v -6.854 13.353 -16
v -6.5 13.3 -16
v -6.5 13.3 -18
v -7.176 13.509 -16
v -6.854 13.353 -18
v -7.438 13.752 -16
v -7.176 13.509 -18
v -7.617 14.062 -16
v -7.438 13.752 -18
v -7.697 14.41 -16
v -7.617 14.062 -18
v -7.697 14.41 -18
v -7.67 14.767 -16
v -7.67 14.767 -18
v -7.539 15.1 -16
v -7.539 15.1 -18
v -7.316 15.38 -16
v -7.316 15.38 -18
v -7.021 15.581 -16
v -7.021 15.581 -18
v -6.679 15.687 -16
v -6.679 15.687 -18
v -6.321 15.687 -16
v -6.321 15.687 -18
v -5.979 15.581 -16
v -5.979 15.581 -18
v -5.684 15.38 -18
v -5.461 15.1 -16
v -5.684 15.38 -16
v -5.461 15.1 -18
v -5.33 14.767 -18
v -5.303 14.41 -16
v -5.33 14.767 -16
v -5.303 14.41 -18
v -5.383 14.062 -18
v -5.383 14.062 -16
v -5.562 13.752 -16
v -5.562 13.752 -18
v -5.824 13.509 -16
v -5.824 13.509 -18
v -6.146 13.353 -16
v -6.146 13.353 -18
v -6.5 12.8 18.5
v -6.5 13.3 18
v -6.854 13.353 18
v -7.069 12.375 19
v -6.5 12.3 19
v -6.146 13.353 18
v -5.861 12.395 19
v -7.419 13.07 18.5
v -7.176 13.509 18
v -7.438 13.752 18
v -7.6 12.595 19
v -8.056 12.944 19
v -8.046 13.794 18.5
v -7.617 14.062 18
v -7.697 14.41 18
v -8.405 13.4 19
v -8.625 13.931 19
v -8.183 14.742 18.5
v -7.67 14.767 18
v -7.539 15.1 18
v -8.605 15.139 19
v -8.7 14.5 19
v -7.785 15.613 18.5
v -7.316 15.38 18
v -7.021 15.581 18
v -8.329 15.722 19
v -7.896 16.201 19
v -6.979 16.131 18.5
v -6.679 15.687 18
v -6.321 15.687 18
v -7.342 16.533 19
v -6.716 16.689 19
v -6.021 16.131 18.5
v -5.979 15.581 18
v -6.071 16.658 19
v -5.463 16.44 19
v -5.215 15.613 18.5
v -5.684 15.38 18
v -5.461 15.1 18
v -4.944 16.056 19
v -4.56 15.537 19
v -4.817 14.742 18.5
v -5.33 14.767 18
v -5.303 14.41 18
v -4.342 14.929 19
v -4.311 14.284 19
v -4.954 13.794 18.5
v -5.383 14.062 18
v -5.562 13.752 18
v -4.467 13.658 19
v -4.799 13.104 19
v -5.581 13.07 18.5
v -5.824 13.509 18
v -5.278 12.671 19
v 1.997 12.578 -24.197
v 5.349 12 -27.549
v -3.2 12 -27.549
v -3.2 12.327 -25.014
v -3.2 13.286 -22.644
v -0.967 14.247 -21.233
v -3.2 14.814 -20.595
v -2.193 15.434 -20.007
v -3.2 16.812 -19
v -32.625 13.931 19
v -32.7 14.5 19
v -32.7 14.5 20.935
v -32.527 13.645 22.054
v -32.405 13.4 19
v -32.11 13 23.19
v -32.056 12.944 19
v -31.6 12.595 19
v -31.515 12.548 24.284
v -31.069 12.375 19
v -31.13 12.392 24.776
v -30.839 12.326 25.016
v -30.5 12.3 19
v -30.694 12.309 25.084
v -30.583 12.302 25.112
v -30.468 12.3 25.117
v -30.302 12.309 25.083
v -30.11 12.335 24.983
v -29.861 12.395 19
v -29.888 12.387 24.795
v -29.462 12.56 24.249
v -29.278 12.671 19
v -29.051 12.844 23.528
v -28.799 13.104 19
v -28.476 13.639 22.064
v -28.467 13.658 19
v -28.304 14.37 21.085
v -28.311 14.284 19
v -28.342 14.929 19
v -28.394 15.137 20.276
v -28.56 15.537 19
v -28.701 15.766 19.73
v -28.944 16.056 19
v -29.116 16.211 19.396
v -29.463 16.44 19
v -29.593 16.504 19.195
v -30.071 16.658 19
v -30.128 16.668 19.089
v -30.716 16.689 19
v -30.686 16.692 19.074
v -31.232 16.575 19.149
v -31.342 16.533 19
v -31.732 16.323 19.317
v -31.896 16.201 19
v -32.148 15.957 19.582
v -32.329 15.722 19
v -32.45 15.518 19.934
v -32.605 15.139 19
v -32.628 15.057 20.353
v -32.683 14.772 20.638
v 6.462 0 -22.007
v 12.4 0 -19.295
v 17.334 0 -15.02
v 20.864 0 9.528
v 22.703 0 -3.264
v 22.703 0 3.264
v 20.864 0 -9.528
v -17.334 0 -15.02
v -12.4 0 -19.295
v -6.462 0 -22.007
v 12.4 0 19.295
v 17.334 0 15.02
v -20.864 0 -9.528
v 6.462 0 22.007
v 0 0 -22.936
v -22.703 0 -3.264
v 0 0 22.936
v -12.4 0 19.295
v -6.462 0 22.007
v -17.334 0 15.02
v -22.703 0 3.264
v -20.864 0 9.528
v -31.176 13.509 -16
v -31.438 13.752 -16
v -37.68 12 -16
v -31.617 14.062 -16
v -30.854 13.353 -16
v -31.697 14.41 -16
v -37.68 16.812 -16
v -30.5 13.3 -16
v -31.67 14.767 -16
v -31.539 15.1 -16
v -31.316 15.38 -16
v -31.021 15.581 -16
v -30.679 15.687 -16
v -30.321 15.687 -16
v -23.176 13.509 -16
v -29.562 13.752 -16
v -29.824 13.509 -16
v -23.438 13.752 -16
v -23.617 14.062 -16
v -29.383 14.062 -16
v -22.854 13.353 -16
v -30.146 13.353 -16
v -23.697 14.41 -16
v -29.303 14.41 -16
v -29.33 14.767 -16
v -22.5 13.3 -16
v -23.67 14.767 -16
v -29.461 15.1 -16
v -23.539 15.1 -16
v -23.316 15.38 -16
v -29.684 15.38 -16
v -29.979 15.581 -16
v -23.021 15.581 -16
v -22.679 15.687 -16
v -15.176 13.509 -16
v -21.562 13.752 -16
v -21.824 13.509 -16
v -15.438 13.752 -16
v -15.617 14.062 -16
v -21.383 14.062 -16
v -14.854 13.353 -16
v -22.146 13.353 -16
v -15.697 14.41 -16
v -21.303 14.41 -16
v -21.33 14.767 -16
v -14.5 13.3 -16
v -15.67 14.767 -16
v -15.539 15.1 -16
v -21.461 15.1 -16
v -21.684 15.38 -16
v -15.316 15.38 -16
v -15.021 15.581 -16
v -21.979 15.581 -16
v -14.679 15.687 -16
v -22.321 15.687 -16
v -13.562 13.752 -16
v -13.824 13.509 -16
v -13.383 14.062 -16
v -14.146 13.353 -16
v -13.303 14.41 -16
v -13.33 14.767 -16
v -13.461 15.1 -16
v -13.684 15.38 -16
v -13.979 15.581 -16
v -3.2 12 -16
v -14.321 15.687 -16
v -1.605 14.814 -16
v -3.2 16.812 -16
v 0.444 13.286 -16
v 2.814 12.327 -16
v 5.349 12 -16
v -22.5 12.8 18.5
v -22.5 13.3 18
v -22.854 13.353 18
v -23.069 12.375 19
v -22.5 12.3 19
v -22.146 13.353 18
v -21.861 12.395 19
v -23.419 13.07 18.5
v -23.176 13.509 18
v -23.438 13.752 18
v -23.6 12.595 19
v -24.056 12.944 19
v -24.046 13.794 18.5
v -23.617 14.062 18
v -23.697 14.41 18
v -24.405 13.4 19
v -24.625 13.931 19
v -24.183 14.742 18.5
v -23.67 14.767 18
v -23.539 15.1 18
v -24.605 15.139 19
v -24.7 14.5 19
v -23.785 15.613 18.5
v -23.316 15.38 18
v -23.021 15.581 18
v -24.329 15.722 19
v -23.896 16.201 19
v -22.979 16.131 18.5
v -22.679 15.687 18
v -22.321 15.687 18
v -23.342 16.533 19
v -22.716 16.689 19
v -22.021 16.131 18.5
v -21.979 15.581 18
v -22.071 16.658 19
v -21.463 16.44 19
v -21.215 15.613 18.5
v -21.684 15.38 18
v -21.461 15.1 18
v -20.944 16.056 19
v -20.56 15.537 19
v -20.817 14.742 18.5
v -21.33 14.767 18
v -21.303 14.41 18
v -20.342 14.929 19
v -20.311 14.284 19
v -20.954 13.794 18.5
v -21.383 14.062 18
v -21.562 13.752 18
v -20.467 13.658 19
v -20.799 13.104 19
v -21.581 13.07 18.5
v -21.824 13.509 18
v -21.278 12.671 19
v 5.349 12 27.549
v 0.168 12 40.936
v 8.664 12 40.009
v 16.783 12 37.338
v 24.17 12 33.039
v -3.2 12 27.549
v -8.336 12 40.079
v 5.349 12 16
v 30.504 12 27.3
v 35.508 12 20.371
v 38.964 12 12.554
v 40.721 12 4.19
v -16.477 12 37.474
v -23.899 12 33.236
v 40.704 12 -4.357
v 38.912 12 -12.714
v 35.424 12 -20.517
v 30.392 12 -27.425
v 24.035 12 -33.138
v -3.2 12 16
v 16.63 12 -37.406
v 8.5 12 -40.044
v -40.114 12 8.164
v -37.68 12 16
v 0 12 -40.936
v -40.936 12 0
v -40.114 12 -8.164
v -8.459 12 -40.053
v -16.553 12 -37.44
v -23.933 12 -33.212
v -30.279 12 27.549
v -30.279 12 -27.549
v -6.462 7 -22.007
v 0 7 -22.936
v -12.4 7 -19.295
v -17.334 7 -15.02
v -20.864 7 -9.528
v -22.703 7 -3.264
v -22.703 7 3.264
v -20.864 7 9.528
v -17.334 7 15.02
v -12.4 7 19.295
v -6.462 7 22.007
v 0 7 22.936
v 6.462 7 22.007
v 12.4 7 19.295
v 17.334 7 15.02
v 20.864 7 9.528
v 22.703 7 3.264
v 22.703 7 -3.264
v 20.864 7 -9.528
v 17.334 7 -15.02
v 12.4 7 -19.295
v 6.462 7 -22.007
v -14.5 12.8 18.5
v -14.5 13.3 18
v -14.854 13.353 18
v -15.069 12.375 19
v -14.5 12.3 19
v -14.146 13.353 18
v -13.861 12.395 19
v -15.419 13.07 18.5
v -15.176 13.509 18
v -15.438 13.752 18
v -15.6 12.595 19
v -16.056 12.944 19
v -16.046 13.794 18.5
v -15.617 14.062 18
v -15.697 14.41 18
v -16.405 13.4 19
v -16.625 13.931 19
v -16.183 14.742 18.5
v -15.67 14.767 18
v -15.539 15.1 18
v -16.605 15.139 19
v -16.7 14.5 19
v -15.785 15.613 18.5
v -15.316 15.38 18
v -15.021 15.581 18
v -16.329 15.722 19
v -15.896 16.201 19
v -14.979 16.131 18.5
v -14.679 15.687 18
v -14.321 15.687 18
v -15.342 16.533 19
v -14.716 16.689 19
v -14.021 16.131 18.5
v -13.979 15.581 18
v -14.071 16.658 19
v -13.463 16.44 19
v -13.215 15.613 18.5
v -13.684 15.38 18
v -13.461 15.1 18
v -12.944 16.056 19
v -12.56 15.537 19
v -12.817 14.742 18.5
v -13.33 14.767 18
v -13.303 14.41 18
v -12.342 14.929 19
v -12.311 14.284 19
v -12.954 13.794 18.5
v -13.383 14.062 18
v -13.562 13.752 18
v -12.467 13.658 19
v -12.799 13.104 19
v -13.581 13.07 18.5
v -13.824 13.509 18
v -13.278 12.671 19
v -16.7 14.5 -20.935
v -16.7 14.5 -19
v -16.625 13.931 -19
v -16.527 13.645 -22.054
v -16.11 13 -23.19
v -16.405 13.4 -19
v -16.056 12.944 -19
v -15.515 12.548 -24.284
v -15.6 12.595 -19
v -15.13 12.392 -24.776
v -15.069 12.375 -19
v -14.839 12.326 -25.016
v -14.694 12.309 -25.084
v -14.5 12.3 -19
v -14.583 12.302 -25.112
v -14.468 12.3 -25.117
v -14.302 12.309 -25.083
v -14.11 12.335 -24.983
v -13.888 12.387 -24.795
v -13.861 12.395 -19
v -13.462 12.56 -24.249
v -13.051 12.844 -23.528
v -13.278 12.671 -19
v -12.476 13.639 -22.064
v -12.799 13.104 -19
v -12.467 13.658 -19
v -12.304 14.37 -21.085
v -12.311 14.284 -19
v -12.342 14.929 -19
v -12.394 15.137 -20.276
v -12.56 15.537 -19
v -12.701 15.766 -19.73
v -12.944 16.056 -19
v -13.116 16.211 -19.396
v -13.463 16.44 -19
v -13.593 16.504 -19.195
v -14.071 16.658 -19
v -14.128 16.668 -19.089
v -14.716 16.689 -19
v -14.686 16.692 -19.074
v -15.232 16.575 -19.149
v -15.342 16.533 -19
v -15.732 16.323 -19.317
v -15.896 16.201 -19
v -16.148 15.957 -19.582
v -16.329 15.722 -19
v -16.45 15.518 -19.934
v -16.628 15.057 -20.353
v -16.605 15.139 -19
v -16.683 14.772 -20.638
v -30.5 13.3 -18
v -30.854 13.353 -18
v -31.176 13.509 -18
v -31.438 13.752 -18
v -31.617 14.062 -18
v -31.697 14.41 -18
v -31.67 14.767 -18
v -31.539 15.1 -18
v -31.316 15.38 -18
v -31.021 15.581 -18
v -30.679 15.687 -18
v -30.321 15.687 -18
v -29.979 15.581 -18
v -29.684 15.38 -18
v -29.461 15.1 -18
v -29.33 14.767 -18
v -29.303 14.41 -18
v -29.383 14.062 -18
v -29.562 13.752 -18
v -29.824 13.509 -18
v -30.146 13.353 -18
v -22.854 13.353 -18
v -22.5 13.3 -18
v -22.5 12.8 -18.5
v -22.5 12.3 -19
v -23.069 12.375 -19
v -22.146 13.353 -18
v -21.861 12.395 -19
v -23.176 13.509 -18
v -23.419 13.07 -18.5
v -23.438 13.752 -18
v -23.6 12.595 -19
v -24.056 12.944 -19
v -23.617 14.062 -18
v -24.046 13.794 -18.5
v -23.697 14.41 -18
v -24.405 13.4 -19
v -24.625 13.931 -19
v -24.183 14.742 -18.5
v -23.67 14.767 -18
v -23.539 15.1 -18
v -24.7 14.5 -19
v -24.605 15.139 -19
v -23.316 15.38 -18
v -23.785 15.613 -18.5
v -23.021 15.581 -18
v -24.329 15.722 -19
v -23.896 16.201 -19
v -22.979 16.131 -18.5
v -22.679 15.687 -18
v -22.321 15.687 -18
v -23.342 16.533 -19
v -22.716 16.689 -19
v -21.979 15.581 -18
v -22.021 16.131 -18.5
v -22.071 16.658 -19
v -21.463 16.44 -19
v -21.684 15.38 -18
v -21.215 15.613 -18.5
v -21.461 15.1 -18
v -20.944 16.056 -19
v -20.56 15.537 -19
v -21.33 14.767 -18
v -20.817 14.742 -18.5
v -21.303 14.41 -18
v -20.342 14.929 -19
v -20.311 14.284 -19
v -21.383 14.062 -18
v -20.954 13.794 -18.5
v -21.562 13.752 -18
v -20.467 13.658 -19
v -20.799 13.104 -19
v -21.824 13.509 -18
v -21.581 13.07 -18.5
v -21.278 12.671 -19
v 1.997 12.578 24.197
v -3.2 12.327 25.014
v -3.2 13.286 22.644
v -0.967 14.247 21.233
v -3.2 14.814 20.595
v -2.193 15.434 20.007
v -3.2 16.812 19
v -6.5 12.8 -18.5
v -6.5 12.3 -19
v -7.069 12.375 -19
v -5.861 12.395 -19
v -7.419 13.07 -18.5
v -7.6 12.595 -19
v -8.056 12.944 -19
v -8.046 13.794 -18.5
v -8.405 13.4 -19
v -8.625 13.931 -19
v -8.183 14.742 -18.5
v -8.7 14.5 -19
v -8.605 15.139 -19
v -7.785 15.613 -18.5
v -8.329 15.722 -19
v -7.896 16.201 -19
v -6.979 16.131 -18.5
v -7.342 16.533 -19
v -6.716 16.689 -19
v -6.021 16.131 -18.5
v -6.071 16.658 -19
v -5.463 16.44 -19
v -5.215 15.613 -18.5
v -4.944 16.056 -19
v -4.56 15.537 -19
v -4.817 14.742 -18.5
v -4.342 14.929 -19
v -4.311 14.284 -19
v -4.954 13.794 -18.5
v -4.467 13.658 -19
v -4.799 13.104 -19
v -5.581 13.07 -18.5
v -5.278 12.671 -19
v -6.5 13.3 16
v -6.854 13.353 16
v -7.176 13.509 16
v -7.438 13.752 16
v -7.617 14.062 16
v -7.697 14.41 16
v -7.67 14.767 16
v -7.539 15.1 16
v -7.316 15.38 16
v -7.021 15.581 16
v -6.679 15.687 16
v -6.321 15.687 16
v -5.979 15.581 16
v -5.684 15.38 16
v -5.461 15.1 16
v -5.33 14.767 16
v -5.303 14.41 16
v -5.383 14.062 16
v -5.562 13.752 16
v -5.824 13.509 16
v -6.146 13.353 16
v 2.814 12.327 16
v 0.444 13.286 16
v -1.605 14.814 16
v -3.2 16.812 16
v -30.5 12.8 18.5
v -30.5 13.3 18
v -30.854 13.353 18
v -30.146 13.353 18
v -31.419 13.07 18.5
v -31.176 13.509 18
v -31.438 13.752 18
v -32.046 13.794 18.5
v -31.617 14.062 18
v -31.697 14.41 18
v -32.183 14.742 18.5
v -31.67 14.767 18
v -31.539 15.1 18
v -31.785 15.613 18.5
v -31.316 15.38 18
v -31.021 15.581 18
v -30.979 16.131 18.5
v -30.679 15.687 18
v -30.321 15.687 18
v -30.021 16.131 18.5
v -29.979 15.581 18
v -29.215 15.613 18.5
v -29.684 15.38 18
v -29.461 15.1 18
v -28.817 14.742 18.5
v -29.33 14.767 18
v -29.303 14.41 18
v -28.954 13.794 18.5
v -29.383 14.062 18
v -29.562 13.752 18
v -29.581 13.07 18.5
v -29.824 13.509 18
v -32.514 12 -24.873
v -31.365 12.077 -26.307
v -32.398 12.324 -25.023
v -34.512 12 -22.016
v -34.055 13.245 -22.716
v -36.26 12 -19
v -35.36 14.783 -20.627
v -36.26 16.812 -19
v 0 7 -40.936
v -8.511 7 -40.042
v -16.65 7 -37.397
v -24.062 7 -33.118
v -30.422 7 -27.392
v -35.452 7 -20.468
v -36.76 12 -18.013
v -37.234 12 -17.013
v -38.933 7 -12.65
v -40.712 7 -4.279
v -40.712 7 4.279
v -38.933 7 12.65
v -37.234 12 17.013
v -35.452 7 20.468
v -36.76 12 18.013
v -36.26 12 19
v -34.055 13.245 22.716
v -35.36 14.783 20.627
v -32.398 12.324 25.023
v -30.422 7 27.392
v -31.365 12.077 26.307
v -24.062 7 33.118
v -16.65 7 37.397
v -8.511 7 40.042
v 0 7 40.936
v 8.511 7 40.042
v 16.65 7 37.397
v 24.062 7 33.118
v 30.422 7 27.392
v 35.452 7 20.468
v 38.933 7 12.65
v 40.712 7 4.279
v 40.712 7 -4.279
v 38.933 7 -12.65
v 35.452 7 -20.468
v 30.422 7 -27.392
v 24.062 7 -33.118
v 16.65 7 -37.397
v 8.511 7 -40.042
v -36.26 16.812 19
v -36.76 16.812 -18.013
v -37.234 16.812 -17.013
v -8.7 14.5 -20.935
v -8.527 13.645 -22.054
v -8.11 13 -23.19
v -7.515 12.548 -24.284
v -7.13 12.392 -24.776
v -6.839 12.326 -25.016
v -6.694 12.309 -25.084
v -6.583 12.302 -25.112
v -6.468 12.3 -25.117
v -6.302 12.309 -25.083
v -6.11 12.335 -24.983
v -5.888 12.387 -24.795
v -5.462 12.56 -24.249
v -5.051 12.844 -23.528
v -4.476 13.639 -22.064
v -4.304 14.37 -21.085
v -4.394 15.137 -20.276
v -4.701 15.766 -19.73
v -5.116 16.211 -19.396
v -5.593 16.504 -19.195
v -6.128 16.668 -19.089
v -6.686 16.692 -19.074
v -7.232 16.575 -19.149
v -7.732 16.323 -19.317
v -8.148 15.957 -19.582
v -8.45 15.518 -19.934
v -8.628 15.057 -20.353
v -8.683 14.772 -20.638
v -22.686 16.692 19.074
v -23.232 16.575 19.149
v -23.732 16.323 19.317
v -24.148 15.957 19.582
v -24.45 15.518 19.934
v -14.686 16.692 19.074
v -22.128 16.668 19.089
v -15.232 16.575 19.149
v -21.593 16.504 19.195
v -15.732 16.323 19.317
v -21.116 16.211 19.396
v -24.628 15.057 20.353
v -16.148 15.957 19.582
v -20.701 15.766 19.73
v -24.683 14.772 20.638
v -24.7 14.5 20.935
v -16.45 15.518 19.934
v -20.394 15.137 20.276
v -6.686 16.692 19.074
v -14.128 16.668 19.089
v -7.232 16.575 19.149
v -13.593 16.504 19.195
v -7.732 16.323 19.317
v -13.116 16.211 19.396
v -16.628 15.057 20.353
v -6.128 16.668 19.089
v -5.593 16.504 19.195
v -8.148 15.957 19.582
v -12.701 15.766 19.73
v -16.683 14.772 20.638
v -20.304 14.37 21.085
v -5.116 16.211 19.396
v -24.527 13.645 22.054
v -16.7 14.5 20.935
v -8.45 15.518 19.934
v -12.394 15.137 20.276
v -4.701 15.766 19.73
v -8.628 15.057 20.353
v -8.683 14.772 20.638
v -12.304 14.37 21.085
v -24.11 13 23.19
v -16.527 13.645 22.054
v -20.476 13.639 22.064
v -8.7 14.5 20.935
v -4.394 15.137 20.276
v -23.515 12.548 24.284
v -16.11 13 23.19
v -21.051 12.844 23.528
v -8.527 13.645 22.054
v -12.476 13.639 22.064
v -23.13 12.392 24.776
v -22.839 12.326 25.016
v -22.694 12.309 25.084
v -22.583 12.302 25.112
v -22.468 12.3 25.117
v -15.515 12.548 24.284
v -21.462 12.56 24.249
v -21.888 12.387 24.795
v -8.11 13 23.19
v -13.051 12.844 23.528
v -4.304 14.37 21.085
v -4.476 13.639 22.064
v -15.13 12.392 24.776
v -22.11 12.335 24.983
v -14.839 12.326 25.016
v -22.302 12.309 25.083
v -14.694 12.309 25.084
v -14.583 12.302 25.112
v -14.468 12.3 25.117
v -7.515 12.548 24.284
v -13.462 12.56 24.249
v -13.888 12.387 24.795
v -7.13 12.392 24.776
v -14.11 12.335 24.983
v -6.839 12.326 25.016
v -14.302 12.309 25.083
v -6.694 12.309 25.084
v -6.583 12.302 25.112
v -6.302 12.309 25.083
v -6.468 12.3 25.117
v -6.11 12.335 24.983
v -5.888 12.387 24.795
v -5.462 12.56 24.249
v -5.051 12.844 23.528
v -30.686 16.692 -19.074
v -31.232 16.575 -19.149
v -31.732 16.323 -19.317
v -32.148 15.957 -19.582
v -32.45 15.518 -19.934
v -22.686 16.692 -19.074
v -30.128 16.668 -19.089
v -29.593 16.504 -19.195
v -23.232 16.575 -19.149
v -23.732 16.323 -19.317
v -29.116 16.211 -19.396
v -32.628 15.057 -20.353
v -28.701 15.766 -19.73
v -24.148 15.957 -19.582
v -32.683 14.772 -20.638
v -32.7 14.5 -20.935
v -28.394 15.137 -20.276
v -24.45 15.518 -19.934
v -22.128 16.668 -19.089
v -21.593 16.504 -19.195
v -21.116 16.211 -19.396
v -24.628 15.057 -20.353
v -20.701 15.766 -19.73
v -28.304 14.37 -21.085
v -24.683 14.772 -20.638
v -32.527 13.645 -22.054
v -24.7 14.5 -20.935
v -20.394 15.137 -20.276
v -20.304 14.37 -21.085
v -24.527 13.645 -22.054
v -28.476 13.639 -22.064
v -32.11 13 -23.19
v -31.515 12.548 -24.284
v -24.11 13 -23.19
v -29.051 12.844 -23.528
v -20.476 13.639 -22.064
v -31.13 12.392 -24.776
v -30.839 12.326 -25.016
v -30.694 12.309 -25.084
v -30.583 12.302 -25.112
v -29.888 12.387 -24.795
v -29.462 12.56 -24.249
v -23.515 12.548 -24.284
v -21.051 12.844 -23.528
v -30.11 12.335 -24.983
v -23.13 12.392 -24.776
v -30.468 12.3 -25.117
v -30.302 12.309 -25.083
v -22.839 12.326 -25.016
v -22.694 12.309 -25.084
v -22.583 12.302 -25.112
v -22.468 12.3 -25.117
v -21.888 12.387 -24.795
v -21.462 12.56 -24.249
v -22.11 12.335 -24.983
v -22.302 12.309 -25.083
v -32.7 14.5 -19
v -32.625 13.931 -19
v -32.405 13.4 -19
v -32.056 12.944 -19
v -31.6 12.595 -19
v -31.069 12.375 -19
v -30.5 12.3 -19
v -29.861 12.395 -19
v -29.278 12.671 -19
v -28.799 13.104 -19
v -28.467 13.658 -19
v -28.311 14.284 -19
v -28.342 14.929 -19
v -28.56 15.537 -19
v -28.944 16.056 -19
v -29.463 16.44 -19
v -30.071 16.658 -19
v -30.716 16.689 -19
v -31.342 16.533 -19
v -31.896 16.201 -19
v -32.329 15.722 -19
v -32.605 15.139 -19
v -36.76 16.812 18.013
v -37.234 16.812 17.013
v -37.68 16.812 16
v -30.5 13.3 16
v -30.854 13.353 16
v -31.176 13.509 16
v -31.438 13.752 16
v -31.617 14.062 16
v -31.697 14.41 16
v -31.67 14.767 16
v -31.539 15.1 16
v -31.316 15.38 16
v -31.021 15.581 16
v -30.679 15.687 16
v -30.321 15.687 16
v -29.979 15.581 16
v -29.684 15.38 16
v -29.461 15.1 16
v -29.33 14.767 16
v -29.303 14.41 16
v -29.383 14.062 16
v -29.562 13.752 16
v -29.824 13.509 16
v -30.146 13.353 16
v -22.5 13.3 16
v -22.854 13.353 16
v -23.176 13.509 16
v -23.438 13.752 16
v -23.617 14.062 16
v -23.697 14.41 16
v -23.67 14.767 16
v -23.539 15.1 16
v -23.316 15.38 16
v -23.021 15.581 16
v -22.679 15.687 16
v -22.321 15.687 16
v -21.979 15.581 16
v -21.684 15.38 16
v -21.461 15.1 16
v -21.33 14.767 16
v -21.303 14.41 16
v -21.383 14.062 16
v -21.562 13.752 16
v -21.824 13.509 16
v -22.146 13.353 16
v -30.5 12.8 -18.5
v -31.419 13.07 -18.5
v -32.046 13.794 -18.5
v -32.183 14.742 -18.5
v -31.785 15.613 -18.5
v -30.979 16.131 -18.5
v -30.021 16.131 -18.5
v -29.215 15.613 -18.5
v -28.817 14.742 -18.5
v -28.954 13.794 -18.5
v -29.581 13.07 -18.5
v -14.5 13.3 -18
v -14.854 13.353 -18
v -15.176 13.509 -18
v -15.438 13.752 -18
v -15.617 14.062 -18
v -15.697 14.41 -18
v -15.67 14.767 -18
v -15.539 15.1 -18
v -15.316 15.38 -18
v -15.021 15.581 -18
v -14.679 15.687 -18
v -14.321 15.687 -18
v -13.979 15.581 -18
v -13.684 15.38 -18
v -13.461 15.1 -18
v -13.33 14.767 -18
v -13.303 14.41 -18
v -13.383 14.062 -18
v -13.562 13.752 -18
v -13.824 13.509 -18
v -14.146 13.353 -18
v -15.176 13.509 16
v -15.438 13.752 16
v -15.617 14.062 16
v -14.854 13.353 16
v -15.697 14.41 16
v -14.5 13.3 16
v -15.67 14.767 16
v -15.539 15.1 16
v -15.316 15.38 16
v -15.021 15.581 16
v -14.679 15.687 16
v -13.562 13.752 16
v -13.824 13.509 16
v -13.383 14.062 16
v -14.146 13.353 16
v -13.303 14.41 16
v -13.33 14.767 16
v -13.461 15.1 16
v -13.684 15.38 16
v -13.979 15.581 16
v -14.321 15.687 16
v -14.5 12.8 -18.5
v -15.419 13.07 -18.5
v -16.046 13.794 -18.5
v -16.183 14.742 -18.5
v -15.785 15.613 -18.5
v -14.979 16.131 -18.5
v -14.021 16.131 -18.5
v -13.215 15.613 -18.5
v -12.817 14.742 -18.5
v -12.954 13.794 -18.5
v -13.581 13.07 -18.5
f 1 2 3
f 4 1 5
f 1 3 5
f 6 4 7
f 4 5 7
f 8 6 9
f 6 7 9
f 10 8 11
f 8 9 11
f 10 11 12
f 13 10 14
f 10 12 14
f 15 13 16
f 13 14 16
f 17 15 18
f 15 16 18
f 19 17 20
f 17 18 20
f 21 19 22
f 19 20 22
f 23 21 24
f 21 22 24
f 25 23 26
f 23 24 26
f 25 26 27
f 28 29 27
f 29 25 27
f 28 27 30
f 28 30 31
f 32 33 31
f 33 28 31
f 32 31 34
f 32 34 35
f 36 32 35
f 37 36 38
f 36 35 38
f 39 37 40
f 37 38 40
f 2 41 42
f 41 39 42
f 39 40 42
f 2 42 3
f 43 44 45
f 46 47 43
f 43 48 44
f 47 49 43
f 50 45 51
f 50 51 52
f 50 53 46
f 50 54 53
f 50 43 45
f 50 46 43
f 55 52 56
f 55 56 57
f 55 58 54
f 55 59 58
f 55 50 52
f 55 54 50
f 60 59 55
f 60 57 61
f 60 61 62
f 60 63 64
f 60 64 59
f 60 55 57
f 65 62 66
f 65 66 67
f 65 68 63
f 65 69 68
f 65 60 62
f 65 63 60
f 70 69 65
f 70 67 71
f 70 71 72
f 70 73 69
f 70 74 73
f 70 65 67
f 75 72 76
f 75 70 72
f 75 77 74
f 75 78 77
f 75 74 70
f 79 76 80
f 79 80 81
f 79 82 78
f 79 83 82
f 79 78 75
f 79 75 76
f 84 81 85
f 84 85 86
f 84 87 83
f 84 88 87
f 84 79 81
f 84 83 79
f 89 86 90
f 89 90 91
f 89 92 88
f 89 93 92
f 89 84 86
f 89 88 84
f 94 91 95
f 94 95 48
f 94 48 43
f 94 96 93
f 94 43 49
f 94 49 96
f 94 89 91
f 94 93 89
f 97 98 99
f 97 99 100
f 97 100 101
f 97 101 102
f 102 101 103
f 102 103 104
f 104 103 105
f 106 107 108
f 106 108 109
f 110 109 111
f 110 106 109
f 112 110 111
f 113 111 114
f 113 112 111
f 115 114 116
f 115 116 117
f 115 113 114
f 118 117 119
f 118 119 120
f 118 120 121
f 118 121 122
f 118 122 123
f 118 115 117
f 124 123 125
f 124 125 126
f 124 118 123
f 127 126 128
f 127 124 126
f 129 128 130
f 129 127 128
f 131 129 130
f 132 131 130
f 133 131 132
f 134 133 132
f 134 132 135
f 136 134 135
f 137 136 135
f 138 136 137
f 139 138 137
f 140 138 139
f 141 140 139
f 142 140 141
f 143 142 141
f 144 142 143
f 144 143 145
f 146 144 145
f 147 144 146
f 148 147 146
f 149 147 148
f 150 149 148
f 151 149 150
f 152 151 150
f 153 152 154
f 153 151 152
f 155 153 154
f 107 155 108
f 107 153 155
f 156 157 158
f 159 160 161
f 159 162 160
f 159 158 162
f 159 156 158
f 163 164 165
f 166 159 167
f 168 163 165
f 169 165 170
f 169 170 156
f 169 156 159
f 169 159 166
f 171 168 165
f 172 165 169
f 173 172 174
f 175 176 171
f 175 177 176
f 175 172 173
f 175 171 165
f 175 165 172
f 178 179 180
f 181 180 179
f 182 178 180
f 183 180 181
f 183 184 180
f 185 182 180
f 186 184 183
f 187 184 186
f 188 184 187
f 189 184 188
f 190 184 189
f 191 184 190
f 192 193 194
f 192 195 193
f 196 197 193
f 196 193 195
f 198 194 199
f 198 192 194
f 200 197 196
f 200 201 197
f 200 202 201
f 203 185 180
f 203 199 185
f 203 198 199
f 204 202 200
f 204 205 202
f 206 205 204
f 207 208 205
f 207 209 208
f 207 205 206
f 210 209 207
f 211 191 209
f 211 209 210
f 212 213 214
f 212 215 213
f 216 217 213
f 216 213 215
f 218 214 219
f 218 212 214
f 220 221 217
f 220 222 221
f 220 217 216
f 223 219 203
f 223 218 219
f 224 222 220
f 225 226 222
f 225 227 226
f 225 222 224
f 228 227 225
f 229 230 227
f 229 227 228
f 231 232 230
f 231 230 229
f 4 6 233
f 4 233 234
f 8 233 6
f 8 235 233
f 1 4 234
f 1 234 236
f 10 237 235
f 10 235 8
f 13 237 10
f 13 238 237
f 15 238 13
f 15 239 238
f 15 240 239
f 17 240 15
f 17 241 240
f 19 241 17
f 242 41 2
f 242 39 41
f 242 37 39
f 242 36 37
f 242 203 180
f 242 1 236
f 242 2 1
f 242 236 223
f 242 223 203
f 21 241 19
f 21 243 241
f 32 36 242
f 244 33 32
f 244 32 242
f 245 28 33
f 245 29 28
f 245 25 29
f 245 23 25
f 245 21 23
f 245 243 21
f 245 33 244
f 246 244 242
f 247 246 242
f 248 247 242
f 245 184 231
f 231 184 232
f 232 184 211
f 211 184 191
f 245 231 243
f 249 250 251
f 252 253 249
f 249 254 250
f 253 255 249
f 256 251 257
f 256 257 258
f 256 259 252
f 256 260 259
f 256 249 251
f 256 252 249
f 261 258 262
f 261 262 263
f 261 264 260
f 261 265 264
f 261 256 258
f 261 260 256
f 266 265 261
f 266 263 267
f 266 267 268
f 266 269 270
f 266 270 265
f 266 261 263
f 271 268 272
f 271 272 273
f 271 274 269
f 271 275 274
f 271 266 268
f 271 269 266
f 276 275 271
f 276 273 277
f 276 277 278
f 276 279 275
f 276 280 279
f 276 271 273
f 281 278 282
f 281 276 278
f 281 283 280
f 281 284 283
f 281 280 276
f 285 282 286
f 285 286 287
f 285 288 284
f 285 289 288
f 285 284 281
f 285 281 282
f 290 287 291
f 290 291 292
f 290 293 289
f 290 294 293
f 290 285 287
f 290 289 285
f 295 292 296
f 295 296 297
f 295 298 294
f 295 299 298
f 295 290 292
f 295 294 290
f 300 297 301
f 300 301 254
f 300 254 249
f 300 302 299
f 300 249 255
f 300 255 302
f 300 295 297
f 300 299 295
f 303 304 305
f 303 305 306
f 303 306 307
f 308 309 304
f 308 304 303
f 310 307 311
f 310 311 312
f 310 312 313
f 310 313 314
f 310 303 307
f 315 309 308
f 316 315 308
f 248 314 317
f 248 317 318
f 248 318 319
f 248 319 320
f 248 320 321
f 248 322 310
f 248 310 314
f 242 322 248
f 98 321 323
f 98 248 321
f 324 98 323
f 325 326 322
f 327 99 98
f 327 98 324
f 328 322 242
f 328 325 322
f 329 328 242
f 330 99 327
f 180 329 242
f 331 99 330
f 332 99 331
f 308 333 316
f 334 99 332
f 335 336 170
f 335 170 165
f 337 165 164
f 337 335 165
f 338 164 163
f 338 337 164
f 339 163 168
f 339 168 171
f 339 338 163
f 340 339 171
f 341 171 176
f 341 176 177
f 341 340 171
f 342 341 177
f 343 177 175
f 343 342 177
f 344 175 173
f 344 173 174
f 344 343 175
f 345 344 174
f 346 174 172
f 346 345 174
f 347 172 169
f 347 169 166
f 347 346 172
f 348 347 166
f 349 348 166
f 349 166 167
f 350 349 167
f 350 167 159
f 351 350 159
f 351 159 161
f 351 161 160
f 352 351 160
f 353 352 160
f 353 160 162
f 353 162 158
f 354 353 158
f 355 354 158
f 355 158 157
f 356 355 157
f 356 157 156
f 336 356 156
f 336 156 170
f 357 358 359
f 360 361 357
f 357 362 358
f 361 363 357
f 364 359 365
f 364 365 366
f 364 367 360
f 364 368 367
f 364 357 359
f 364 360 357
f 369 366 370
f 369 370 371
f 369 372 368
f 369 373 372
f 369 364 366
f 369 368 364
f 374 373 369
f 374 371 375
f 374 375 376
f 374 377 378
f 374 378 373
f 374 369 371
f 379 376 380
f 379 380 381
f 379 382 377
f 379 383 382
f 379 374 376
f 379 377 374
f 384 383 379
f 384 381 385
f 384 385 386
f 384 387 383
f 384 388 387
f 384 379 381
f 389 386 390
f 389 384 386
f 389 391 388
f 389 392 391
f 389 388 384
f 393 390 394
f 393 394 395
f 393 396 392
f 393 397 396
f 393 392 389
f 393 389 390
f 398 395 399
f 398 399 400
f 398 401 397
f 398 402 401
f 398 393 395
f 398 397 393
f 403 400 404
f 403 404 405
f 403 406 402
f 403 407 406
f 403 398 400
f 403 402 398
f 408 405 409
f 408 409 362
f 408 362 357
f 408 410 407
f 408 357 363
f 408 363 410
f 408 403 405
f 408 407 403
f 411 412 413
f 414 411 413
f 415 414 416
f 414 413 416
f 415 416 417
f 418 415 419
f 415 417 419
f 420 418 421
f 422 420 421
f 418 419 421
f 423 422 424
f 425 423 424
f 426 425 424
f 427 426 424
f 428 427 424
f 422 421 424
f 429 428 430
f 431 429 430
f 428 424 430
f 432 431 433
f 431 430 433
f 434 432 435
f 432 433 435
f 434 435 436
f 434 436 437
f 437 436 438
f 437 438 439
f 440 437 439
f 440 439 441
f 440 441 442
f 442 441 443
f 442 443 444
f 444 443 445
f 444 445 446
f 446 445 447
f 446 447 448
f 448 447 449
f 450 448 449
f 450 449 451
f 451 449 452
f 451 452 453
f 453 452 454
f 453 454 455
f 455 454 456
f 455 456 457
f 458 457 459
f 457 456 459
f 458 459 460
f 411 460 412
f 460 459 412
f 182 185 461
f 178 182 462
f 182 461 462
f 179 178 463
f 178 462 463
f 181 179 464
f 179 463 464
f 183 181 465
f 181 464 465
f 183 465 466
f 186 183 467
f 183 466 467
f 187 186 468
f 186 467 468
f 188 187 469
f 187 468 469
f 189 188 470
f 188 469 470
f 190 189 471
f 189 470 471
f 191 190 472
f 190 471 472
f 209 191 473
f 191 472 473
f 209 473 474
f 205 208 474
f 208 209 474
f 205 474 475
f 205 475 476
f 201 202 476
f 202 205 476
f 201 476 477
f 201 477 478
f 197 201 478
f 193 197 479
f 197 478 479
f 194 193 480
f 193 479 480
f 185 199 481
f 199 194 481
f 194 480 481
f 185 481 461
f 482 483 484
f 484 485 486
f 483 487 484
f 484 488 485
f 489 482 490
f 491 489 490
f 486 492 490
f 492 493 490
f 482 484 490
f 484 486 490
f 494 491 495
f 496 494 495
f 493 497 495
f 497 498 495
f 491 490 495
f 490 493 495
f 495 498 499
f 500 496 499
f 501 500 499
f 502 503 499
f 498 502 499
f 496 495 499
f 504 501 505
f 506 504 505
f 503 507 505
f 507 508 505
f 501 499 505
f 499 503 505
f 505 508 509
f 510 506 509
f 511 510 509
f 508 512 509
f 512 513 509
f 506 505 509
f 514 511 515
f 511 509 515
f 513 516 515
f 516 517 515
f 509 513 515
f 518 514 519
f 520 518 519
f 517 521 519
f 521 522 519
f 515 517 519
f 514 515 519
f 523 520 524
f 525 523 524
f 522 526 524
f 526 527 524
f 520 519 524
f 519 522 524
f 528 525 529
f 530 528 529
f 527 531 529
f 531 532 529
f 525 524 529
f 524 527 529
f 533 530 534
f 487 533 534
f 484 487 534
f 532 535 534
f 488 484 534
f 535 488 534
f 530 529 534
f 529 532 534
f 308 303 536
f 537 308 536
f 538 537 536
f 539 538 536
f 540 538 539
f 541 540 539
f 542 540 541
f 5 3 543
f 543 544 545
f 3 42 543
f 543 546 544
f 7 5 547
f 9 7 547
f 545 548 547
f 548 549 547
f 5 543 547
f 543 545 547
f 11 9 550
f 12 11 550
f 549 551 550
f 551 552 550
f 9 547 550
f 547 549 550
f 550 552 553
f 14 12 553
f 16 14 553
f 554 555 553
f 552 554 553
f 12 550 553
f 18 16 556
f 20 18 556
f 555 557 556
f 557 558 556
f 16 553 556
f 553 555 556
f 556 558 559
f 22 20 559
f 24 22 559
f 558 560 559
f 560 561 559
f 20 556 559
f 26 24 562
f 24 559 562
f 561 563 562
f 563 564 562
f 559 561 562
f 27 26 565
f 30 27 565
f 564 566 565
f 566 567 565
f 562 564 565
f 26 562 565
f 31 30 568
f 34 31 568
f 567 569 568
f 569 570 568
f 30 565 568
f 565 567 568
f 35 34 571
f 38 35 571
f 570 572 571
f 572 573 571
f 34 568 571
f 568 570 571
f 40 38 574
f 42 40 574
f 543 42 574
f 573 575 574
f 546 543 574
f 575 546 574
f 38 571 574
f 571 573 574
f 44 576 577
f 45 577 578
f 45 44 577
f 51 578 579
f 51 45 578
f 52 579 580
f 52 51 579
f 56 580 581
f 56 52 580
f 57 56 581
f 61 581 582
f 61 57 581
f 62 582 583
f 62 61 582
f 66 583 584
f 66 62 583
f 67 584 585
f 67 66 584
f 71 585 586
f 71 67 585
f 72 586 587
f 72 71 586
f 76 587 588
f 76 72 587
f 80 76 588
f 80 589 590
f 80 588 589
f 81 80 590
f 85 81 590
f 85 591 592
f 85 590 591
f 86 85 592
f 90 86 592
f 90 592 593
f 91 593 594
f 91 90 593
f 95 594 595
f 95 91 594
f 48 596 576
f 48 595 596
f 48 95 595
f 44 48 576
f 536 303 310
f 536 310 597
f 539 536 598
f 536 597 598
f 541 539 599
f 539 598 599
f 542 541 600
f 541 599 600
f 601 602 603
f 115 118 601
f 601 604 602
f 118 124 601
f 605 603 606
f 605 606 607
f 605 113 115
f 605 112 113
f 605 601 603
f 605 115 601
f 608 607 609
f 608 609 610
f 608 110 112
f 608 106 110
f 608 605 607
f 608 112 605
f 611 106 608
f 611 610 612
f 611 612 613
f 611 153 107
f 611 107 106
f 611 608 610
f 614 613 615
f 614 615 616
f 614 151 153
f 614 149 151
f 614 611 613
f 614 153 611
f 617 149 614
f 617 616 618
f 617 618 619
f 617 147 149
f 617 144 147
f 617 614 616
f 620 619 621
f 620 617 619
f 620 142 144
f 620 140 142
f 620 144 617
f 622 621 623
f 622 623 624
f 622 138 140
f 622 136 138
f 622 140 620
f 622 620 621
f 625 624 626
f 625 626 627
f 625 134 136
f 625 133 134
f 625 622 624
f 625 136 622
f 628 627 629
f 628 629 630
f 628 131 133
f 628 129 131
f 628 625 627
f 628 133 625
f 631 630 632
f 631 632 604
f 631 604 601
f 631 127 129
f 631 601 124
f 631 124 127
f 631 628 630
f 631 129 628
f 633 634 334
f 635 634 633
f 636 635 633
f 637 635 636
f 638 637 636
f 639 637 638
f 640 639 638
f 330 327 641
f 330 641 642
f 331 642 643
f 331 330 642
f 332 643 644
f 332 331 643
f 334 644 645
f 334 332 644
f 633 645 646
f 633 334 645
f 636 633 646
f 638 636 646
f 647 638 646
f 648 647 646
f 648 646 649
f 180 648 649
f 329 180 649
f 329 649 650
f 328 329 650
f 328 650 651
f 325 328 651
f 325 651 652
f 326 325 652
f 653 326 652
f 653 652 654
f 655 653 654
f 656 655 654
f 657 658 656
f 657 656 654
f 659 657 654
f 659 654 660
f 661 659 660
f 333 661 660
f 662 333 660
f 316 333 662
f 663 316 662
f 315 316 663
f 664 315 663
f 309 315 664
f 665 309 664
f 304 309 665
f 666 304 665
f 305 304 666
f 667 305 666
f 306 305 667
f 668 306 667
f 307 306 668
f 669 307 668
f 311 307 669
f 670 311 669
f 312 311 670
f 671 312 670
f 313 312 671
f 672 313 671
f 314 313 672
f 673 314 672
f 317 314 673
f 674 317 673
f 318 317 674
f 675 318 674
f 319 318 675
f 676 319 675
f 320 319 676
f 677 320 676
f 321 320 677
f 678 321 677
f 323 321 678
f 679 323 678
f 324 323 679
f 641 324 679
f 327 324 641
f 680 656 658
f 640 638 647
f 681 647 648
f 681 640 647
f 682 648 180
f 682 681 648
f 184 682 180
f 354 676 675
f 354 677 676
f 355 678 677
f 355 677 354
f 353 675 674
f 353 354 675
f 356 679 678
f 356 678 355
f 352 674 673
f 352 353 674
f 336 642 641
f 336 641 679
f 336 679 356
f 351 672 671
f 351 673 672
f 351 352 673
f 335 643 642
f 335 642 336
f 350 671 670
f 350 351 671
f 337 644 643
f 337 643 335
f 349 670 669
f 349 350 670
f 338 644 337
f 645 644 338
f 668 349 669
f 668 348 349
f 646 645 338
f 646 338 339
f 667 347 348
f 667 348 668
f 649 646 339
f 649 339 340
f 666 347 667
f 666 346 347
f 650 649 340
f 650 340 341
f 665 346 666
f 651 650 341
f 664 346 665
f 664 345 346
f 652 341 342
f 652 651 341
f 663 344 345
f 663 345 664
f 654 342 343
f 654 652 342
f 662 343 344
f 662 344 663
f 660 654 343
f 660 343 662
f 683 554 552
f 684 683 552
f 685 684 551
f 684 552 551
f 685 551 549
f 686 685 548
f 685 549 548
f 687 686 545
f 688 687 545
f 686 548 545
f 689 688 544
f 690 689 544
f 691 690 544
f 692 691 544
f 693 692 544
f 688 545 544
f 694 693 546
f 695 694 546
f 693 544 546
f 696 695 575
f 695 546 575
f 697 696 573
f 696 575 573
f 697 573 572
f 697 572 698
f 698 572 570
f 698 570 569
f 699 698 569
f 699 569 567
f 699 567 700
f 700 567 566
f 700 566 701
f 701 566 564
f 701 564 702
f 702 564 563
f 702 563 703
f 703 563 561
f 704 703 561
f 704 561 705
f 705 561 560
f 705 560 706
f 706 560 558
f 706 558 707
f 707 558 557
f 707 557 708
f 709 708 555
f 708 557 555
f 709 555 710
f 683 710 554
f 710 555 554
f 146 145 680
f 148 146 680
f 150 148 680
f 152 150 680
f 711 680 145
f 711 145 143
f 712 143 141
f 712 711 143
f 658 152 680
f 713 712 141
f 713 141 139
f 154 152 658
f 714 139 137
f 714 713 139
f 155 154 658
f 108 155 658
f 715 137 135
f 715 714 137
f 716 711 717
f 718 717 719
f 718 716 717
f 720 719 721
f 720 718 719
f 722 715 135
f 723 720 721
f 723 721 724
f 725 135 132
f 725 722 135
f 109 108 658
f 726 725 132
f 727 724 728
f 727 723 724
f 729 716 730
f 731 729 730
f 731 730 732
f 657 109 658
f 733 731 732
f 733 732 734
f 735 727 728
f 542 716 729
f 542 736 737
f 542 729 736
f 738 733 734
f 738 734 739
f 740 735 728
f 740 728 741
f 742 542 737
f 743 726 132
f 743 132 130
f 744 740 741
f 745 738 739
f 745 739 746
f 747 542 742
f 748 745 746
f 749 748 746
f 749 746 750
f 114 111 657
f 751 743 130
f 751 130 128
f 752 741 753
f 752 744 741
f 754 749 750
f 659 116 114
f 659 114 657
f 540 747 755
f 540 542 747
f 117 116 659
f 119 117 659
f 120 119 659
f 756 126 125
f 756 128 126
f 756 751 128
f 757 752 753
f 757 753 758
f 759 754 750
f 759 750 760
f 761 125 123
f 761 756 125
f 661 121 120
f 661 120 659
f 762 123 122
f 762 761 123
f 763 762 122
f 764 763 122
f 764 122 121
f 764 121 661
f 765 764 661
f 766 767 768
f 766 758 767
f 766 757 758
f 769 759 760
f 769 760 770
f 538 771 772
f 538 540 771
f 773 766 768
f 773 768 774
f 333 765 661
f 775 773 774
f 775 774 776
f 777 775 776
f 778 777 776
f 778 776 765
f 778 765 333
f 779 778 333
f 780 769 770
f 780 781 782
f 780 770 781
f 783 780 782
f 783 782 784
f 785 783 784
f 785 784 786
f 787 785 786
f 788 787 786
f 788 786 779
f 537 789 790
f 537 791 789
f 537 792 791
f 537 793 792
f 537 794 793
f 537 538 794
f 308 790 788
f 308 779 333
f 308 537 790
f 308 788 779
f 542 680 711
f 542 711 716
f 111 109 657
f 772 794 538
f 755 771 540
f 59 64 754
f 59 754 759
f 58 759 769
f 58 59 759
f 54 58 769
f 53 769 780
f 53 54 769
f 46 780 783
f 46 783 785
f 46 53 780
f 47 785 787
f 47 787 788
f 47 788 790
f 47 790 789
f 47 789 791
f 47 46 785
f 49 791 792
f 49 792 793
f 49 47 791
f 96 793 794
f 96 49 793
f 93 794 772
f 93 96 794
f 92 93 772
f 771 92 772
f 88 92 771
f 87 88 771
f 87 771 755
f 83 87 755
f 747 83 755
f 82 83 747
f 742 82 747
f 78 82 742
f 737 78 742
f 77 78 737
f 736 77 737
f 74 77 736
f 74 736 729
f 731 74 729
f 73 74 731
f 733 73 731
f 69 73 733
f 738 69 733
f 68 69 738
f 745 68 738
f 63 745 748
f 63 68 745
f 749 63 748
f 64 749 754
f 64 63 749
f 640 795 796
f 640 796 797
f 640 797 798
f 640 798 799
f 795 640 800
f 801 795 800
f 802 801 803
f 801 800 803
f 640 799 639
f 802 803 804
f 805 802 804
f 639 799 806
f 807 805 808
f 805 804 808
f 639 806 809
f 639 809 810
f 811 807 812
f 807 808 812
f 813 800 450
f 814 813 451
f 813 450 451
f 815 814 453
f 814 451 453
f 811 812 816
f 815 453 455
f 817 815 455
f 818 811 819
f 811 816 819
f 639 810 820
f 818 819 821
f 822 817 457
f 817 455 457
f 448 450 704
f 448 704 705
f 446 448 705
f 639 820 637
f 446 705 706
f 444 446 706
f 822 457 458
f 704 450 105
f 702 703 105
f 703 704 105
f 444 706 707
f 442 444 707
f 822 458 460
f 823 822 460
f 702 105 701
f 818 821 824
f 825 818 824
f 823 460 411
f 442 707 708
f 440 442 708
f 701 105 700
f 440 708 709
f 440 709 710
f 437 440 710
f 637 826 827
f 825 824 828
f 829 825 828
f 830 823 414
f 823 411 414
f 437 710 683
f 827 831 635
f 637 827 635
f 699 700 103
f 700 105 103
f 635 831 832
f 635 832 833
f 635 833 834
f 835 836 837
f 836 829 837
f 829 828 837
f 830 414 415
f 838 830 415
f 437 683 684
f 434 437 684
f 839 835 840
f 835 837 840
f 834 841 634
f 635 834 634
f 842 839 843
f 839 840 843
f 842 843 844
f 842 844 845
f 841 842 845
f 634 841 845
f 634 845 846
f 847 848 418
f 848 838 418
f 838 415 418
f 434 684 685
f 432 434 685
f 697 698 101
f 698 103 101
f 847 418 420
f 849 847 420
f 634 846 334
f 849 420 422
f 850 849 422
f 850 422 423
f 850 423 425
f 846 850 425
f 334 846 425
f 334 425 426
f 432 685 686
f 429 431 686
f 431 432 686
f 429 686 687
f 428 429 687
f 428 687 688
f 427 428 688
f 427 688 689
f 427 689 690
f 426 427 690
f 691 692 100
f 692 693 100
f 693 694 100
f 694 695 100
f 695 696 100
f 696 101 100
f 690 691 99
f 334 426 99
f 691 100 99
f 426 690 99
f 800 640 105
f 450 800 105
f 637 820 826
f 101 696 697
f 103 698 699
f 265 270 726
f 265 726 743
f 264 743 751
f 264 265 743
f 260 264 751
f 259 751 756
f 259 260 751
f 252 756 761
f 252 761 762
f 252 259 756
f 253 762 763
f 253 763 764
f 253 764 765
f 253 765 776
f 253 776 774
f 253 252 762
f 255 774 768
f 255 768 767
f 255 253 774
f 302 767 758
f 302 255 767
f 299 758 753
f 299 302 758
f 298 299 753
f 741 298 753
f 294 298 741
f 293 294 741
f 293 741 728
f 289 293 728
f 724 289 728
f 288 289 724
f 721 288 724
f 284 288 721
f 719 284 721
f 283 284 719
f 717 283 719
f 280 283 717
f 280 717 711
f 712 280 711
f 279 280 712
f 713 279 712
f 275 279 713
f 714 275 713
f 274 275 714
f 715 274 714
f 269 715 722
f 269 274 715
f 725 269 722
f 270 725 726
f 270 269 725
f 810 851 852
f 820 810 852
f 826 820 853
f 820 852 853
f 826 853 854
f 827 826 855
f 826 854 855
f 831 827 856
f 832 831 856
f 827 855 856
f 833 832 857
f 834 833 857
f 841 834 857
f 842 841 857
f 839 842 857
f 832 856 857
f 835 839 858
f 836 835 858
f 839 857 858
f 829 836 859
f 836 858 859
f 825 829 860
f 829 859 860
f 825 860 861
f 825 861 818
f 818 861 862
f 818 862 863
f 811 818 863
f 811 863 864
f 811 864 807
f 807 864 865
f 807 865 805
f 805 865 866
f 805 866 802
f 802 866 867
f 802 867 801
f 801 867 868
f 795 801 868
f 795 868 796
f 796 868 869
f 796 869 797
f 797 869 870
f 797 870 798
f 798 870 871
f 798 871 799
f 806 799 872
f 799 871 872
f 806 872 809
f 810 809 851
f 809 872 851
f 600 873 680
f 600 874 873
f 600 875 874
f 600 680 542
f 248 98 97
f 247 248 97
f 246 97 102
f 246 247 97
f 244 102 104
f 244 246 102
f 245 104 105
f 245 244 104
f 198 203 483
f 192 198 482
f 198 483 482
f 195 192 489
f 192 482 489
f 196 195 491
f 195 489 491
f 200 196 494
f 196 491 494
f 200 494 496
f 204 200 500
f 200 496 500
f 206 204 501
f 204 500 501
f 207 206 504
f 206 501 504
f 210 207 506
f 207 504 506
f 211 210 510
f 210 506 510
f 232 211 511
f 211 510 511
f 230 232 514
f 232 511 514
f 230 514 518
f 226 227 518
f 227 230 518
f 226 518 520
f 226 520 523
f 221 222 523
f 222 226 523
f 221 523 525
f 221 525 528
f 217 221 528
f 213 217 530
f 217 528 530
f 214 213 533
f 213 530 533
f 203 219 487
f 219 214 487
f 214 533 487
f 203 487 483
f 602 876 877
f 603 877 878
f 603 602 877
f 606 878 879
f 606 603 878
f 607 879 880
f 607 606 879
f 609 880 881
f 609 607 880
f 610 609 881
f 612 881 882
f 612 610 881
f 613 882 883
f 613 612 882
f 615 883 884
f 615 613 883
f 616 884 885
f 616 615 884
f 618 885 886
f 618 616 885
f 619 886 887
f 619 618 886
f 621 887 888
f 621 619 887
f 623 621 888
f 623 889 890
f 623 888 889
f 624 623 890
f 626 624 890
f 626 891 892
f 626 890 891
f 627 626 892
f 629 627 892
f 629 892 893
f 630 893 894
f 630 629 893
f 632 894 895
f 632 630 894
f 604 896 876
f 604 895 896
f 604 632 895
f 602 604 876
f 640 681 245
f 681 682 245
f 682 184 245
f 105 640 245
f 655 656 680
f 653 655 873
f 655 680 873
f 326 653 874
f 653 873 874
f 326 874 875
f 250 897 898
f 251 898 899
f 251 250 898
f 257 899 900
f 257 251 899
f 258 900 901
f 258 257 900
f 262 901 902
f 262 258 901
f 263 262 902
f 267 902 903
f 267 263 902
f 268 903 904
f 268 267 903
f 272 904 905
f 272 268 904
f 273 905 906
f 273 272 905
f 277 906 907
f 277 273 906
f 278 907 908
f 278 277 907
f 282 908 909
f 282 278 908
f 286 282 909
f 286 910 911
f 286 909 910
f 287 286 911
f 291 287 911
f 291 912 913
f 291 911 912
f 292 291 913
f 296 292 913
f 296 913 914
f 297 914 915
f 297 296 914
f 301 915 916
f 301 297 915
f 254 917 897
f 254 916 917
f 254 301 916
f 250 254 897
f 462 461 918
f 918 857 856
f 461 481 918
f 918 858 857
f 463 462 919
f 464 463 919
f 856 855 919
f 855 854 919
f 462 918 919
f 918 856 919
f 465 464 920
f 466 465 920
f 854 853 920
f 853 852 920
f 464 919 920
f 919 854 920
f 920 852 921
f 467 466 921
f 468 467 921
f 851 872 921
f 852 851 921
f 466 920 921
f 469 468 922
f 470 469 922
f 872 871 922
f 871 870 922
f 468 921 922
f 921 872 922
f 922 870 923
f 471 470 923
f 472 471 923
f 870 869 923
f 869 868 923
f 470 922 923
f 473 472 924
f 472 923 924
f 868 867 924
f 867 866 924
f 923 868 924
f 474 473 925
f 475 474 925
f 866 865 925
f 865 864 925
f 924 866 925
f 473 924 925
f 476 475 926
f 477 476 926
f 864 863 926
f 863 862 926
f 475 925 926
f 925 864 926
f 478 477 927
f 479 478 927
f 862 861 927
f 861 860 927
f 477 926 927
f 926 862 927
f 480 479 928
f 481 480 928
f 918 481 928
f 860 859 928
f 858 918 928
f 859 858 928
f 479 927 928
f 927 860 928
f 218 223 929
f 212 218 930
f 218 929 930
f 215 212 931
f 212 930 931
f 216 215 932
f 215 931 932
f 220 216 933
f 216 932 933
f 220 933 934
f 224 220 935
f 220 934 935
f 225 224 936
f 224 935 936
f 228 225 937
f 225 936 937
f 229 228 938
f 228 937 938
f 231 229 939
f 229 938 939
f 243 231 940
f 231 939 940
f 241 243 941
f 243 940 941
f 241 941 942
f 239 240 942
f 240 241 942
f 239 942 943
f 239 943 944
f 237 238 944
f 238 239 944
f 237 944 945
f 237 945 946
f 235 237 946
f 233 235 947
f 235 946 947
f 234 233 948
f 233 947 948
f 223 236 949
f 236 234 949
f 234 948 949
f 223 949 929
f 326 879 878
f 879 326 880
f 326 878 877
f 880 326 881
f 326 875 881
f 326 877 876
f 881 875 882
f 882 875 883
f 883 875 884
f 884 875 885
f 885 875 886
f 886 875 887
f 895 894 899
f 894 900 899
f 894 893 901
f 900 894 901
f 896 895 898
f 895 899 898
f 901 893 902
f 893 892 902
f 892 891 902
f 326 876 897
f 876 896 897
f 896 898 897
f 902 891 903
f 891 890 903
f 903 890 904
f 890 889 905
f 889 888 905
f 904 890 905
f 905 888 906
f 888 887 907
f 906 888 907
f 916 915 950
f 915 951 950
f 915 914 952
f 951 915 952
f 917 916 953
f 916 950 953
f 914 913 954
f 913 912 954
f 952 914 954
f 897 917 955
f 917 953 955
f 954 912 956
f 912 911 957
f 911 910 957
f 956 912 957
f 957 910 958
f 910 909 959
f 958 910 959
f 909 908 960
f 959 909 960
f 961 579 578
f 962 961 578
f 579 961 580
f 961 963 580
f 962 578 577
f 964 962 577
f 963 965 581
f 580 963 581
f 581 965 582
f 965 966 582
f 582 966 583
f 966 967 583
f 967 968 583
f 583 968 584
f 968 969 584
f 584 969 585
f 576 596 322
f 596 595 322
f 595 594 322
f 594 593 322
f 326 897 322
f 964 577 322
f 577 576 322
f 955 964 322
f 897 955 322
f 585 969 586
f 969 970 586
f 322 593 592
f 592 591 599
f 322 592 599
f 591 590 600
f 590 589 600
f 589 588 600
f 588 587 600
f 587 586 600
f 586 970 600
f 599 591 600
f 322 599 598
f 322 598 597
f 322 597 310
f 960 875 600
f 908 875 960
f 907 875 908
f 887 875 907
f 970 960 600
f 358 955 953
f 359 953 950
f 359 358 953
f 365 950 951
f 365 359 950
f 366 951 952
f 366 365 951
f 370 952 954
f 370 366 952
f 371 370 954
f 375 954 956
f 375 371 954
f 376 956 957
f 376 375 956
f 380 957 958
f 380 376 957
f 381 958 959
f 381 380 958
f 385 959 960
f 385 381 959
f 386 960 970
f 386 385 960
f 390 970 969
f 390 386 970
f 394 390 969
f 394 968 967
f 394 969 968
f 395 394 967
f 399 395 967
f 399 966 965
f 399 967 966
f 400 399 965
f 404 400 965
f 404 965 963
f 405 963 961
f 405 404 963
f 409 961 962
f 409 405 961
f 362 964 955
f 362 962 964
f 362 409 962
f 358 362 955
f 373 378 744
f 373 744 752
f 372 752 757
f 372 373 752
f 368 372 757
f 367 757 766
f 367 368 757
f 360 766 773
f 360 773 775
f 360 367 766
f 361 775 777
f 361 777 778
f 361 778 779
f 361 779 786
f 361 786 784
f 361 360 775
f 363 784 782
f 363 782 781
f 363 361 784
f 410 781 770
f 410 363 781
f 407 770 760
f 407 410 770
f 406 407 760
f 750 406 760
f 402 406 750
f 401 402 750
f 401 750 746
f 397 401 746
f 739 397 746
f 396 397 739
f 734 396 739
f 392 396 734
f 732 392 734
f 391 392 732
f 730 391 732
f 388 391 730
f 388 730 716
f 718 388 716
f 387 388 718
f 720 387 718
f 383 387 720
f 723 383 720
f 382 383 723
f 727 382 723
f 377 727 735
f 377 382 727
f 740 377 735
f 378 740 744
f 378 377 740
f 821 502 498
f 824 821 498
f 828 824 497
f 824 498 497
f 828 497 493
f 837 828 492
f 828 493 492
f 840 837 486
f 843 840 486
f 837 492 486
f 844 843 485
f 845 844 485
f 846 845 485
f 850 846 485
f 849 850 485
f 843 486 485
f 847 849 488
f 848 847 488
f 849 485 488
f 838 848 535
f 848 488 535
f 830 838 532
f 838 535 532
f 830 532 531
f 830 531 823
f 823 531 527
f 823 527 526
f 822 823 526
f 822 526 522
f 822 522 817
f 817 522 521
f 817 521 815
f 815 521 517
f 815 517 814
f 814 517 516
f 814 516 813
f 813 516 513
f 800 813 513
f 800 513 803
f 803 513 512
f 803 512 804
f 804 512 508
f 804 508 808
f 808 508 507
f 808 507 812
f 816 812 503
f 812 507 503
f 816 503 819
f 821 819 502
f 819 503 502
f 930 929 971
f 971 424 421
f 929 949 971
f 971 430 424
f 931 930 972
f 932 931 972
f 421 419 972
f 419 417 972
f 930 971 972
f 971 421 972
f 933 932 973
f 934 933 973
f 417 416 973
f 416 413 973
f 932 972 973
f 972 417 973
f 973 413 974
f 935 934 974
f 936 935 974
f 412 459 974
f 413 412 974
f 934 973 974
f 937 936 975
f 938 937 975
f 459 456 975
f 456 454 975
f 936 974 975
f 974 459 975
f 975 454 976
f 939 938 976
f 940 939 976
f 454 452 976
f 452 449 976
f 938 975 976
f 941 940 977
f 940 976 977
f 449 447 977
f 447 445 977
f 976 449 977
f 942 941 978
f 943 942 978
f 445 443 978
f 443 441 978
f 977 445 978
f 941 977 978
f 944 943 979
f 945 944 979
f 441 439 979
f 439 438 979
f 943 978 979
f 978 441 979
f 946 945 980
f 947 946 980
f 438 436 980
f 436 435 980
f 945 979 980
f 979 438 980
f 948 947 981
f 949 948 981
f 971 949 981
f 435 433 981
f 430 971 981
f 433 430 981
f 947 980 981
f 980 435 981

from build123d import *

# Parameters (mm, degrees)
SKETCH2_W           = 34.480194164
SKETCH2_H           = 4.812435565
BOSS_EXTRUDE1_DEPTH = 3
FILLET1_R           = 10
SKETCH8_R           = 2.2
CUT_EXTRUDE1_DEPTH  = 13
LPATTERN1_COUNT     = 4
LPATTERN1_PITCH     = 8
CUT_EXTRUDE2_DEPTH  = 13
FILLET2_START       = 16
FILLET2_DEPTH       = 11.549220739
FILLET2_START_2     = -3.2
FILLET2_2_DEPTH     = 8.549220739


with BuildPart() as part:
    # Sketch1 → Revolve1 (revolve)
    with BuildSketch(Plane.XY, mode=Mode.PRIVATE) as revolve1_sk:
        Polygon((0, 0), (22.9365, 0), (22.9365, 7), (40.9365, 7), (40.9365, 12), (0, 12), align=None)
    revolve(revolve1_sk.sketch.rotate(Axis((0, 0, 0), (0, 1, 0)), 90), axis=Axis((0, 0, 0), (0, 1, 0)))

    # Sketch2 → Boss-Extrude1 (add)
    with BuildSketch(Plane.XY.offset(16)):
        with Locations((-20.440097082, 14.406217783)):
            Rectangle(SKETCH2_W, SKETCH2_H)
    extrude(amount=BOSS_EXTRUDE1_DEPTH)

    # Fillet1
    # the kernel refuses this fillet: 10 mm, written as the material it adds along each edge
    with BuildSketch(Plane(origin=(-3.2, 12, 19), x_dir=(0, 0, 1), z_dir=(-1, 0, 0))) as fillet1_piece_1_section:
        with BuildLine():
            CenterArc((8.549220739, 10), FILLET1_R, 211.248873094, 58.751126906)
            Line((0, 4.812435565), (0, 0))
            Line((0, 0), (8.549220739, 0))
        make_face()
    fillet1_piece_1 = extrude(amount=54.43318191, mode=Mode.PRIVATE)
    fillet1_piece_1 = fillet1_piece_1 & Plane(origin=(0, 12, 0), x_dir=(0, 0, -1), z_dir=(0, 1, 0)) * Cylinder(40.9365, 144, mode=Mode.PRIVATE)
    add(fillet1_piece_1)

    # Sketch7 → CSK for M2 Countersunk Flat Head Screw2 (revolve, cut)
    with BuildSketch(Plane(origin=(-30.5, 14.5, 19), x_dir=(0, -1, 0), z_dir=(1, 0, 0))):
        Polygon((0, 0), (0, 59.9365), (1.2, 59.9365), (1.2, 1), (2.2, 0), align=None)
    csk_for_m2_countersunk_flat_head_screw2 = revolve(axis=Axis((-30.5, 14.5, 25.35), (0, 0, -1)), mode=Mode.SUBTRACT)

    # Sketch8 → Cut-Extrude1 (cut)
    with BuildSketch(Plane.XY.offset(19)):
        with Locations(Location((-30.5, 14.5, 0), (0, 0, 180))):
            Circle(SKETCH8_R)
    cut_extrude1 = extrude(amount=CUT_EXTRUDE1_DEPTH, mode=Mode.SUBTRACT)

    # LPattern1: CSK for M2 Countersunk Flat Head Screw2, Cut-Extrude1 ×4
    with Locations(*[(i * LPATTERN1_PITCH, 0, 0) for i in range(1, LPATTERN1_COUNT)]):
        add(csk_for_m2_countersunk_flat_head_screw2, mode=Mode.SUBTRACT)
        add(cut_extrude1, mode=Mode.SUBTRACT)

    # Sketch10 → Cut-Extrude2 (cut)
    with BuildSketch(Plane(origin=(0, 16.812435565, 0), x_dir=(1, 0, 0), z_dir=(0, 1, 0))):
        with BuildLine():
            Line((-37.680194164, -19), (-36.260130064, -19))
            ThreePointArc((-36.260130064, -19), (-37.000579546, -17.514398234), (-37.680194164, -16))
            Line((-37.680194164, -16), (-37.680194164, -19))
        make_face()
    extrude(amount=-CUT_EXTRUDE2_DEPTH, mode=Mode.SUBTRACT)

    # Fillet2: read off the stored shape, not the designer's step
    # Fillet2 outline → Fillet2 (add)
    with BuildSketch(Plane.XY.offset(FILLET2_START)):
        with BuildLine():
            ThreePointArc((5.349220739, 12), (0.443899361, 13.285768986), (-3.2, 16.812435565))
            Line((-3.2, 16.812435565), (-3.2, 12))
            Line((-3.2, 12), (5.349220739, 12))
        make_face()
    extrude(amount=FILLET2_DEPTH)

    # Fillet2 2 outline → Fillet2 2 (cut)
    with BuildSketch(Plane.YZ.offset(FILLET2_START_2)):
        with BuildLine():
            Line((18, 27.549220739), (12, 27.549220739))
            ThreePointArc((12, 27.549220739), (13.285768986, 22.643899361), (16.812435565, 19))
            Line((16.812435565, 19), (18, 18.279400168))
            Line((18, 18.279400168), (18, 27.549220739))
        make_face()
    extrude(amount=FILLET2_2_DEPTH, mode=Mode.SUBTRACT)

    # Mirror1: read off the stored shape, not the designer's step
    # Mirror1: part across plane


with BuildPart() as part_1:
    add(part.part)
    add(part.part.mirror(Plane.XY))


solid = part_1.part
